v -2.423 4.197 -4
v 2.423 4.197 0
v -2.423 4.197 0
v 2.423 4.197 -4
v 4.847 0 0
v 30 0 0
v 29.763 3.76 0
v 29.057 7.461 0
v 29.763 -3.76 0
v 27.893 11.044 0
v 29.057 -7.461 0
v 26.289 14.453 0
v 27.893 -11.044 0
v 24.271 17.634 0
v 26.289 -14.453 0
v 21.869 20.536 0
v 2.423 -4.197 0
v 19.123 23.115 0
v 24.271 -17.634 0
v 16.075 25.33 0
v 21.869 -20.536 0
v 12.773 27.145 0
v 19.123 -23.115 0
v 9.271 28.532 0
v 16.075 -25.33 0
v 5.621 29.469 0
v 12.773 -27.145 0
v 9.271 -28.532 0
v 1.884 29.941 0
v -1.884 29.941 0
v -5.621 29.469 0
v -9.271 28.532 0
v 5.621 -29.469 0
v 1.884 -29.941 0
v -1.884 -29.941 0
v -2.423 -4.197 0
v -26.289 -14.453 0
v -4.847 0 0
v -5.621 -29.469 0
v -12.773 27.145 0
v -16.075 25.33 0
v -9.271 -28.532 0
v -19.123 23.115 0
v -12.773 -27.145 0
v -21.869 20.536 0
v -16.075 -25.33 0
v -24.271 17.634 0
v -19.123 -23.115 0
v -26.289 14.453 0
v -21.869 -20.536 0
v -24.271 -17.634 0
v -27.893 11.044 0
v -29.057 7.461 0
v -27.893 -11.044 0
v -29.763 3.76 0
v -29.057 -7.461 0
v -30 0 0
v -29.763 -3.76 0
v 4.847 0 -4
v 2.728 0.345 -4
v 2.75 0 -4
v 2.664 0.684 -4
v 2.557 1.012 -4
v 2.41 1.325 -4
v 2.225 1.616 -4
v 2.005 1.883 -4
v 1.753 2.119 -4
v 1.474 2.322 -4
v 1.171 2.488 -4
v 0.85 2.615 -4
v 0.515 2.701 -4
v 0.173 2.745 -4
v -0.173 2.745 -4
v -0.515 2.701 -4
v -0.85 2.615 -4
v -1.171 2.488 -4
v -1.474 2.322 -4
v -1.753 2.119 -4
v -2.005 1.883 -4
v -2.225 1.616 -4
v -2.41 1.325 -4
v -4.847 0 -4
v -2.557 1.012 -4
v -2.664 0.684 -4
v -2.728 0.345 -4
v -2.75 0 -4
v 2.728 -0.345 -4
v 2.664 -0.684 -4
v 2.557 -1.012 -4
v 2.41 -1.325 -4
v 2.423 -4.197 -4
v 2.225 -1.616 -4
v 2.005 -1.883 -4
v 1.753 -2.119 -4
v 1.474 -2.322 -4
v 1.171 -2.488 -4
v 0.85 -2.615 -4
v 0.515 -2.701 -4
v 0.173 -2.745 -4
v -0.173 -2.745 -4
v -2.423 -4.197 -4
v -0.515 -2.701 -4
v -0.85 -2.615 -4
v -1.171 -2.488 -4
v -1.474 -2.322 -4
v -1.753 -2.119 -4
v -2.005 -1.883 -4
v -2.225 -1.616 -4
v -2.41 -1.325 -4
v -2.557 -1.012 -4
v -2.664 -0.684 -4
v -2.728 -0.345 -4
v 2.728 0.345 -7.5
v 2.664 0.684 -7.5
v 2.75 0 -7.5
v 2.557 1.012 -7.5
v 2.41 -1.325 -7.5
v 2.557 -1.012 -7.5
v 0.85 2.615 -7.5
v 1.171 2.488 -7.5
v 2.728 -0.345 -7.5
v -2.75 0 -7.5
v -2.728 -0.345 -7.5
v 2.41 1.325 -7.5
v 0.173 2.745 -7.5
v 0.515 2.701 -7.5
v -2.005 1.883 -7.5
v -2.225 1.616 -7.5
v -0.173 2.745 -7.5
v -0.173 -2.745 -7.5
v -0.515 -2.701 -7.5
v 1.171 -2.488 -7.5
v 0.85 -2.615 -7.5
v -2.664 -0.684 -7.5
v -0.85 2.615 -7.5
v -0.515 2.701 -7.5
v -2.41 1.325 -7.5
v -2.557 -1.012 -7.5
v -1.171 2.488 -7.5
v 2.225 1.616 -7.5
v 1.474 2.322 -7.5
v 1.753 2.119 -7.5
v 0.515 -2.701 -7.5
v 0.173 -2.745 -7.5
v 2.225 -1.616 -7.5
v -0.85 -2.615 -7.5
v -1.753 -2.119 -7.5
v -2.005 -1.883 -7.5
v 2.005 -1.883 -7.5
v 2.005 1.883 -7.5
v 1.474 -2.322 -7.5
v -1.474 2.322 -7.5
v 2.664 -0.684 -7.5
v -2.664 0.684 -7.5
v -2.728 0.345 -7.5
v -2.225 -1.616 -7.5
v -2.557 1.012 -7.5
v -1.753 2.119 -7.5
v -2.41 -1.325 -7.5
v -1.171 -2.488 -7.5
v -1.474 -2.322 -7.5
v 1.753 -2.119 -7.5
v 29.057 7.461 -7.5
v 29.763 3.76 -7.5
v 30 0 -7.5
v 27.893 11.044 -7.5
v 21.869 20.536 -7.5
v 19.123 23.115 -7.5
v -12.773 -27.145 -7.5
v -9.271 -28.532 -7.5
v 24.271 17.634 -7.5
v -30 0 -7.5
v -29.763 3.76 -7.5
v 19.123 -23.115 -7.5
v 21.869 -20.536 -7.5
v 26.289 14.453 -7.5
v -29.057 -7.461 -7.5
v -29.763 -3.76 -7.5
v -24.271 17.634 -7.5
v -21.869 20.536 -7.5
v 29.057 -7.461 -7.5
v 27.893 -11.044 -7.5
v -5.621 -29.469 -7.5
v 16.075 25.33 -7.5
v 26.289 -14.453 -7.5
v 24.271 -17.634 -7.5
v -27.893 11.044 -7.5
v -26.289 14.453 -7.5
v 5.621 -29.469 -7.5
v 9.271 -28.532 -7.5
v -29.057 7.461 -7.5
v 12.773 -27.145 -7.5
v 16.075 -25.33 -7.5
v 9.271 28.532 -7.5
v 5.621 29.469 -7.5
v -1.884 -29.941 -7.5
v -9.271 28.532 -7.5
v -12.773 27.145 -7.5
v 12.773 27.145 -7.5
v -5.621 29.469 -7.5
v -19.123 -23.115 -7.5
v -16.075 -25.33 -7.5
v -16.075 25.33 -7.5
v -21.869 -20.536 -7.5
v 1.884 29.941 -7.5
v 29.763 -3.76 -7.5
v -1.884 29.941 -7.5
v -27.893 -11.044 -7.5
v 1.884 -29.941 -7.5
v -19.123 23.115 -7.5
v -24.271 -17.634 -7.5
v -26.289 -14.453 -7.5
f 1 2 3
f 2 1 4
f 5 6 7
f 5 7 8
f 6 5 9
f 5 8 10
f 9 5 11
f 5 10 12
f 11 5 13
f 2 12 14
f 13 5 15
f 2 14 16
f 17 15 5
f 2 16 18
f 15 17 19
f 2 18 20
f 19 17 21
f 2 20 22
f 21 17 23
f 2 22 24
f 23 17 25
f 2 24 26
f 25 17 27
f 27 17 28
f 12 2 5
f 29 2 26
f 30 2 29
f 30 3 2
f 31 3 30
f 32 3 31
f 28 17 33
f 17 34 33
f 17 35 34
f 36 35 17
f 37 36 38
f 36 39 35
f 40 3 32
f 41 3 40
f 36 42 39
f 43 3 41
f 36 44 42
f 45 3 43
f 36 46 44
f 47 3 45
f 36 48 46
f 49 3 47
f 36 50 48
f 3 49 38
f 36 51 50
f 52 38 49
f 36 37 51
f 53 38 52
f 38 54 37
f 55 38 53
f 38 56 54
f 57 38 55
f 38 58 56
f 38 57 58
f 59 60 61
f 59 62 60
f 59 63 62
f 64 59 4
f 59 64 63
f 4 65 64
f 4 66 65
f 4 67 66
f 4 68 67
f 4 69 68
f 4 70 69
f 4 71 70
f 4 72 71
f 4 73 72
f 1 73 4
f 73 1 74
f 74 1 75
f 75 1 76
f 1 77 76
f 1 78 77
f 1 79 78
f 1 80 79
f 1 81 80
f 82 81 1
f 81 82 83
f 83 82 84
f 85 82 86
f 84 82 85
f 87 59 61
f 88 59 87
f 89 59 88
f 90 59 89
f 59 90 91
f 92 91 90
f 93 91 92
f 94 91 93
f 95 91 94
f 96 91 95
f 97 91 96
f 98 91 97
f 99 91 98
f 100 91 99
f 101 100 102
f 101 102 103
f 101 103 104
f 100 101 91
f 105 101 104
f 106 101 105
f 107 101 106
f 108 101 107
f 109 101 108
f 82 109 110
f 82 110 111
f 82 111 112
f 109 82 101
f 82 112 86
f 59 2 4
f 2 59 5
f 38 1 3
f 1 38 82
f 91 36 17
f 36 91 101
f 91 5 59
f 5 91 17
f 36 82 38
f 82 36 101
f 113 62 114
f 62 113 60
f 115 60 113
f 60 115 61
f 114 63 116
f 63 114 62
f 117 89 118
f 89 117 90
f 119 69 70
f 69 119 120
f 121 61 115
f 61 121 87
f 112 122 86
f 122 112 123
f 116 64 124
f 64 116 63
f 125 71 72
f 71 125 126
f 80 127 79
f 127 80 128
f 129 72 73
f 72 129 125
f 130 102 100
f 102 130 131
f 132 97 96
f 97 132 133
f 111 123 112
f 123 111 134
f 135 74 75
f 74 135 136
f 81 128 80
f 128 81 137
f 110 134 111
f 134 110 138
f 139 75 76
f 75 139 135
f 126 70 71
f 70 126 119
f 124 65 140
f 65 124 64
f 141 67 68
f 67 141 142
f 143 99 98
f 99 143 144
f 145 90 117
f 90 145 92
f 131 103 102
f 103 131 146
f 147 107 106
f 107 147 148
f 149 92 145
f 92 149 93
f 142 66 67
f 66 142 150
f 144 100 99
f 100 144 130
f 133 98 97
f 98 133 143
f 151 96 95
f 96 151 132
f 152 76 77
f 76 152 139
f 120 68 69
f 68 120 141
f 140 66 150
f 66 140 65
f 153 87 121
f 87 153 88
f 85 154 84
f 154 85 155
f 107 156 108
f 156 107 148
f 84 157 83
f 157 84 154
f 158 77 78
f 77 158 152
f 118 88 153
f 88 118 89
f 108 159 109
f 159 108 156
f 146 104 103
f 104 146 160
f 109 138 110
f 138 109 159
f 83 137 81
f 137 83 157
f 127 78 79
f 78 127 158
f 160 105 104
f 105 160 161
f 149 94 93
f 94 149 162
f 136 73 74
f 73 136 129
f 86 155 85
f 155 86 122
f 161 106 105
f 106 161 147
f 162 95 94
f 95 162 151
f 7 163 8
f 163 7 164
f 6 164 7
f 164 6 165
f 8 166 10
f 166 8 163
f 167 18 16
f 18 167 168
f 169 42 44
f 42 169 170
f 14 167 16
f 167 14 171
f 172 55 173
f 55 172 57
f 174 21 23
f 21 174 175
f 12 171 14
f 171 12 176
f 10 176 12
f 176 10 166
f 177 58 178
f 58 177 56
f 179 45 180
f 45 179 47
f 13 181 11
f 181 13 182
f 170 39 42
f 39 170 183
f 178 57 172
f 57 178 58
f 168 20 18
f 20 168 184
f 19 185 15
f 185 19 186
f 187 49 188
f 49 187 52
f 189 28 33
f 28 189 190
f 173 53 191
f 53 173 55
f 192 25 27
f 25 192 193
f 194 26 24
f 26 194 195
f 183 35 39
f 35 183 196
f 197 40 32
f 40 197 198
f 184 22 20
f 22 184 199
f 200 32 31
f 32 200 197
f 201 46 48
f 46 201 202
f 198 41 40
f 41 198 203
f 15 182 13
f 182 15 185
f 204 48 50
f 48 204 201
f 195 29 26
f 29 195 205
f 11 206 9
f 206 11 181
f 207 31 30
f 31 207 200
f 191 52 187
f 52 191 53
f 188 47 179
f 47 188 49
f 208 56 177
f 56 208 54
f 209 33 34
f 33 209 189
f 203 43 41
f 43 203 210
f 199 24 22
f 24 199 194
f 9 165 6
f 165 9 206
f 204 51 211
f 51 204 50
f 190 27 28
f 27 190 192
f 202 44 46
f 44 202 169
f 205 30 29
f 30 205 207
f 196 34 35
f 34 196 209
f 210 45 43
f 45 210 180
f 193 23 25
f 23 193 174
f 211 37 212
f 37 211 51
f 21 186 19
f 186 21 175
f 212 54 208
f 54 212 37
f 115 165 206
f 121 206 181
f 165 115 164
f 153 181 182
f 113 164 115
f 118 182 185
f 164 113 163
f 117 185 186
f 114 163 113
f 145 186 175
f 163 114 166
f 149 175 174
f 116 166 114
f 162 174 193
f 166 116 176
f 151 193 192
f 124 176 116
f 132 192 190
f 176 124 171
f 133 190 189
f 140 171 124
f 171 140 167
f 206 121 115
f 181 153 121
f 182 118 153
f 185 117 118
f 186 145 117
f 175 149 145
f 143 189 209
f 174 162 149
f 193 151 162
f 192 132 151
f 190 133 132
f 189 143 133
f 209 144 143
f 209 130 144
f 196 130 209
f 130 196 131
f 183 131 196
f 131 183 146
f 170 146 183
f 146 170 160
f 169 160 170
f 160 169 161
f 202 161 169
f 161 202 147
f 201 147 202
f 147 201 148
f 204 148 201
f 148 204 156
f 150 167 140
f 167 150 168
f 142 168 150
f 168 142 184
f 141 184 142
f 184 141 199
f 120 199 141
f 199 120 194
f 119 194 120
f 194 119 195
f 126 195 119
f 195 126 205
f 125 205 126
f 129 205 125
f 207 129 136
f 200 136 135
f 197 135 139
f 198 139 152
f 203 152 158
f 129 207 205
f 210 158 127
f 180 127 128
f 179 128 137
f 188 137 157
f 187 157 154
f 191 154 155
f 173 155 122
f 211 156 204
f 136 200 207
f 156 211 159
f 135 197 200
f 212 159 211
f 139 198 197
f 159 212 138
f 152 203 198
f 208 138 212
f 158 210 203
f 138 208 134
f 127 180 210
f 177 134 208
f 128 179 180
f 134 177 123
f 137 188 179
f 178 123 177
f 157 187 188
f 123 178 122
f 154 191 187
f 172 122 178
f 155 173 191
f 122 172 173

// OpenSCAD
$fn = 50;

difference() {
	union() {
		translate(v = [0, 0, -7.5]) {
			cylinder(h = 7.5, r = 30.0);
		}
	}
	union() {
		translate(v = [0, 0, 0]) {
			rotate(a = [0, 0, 0]) {
				difference() {
					union() {
						translate(v = [0, 0, -4]) {
							linear_extrude(height = 4) {
								polygon(points = [[4.8468, 0.0], [2.4234000000000004, 4.197451927062417], [-2.423399999999999, 4.197451927062417], [-4.8468, 5.935618106107392e-16], [-2.423400000000002, -4.197451927062416], [2.423399999999997, -4.197451927062419]]);
							}
						}
					}
					union();
				}
			}
		}
		#translate(v = [0, 0, -100.0]) {
			cylinder(h = 200, r = 2.75);
		}
	}
}
